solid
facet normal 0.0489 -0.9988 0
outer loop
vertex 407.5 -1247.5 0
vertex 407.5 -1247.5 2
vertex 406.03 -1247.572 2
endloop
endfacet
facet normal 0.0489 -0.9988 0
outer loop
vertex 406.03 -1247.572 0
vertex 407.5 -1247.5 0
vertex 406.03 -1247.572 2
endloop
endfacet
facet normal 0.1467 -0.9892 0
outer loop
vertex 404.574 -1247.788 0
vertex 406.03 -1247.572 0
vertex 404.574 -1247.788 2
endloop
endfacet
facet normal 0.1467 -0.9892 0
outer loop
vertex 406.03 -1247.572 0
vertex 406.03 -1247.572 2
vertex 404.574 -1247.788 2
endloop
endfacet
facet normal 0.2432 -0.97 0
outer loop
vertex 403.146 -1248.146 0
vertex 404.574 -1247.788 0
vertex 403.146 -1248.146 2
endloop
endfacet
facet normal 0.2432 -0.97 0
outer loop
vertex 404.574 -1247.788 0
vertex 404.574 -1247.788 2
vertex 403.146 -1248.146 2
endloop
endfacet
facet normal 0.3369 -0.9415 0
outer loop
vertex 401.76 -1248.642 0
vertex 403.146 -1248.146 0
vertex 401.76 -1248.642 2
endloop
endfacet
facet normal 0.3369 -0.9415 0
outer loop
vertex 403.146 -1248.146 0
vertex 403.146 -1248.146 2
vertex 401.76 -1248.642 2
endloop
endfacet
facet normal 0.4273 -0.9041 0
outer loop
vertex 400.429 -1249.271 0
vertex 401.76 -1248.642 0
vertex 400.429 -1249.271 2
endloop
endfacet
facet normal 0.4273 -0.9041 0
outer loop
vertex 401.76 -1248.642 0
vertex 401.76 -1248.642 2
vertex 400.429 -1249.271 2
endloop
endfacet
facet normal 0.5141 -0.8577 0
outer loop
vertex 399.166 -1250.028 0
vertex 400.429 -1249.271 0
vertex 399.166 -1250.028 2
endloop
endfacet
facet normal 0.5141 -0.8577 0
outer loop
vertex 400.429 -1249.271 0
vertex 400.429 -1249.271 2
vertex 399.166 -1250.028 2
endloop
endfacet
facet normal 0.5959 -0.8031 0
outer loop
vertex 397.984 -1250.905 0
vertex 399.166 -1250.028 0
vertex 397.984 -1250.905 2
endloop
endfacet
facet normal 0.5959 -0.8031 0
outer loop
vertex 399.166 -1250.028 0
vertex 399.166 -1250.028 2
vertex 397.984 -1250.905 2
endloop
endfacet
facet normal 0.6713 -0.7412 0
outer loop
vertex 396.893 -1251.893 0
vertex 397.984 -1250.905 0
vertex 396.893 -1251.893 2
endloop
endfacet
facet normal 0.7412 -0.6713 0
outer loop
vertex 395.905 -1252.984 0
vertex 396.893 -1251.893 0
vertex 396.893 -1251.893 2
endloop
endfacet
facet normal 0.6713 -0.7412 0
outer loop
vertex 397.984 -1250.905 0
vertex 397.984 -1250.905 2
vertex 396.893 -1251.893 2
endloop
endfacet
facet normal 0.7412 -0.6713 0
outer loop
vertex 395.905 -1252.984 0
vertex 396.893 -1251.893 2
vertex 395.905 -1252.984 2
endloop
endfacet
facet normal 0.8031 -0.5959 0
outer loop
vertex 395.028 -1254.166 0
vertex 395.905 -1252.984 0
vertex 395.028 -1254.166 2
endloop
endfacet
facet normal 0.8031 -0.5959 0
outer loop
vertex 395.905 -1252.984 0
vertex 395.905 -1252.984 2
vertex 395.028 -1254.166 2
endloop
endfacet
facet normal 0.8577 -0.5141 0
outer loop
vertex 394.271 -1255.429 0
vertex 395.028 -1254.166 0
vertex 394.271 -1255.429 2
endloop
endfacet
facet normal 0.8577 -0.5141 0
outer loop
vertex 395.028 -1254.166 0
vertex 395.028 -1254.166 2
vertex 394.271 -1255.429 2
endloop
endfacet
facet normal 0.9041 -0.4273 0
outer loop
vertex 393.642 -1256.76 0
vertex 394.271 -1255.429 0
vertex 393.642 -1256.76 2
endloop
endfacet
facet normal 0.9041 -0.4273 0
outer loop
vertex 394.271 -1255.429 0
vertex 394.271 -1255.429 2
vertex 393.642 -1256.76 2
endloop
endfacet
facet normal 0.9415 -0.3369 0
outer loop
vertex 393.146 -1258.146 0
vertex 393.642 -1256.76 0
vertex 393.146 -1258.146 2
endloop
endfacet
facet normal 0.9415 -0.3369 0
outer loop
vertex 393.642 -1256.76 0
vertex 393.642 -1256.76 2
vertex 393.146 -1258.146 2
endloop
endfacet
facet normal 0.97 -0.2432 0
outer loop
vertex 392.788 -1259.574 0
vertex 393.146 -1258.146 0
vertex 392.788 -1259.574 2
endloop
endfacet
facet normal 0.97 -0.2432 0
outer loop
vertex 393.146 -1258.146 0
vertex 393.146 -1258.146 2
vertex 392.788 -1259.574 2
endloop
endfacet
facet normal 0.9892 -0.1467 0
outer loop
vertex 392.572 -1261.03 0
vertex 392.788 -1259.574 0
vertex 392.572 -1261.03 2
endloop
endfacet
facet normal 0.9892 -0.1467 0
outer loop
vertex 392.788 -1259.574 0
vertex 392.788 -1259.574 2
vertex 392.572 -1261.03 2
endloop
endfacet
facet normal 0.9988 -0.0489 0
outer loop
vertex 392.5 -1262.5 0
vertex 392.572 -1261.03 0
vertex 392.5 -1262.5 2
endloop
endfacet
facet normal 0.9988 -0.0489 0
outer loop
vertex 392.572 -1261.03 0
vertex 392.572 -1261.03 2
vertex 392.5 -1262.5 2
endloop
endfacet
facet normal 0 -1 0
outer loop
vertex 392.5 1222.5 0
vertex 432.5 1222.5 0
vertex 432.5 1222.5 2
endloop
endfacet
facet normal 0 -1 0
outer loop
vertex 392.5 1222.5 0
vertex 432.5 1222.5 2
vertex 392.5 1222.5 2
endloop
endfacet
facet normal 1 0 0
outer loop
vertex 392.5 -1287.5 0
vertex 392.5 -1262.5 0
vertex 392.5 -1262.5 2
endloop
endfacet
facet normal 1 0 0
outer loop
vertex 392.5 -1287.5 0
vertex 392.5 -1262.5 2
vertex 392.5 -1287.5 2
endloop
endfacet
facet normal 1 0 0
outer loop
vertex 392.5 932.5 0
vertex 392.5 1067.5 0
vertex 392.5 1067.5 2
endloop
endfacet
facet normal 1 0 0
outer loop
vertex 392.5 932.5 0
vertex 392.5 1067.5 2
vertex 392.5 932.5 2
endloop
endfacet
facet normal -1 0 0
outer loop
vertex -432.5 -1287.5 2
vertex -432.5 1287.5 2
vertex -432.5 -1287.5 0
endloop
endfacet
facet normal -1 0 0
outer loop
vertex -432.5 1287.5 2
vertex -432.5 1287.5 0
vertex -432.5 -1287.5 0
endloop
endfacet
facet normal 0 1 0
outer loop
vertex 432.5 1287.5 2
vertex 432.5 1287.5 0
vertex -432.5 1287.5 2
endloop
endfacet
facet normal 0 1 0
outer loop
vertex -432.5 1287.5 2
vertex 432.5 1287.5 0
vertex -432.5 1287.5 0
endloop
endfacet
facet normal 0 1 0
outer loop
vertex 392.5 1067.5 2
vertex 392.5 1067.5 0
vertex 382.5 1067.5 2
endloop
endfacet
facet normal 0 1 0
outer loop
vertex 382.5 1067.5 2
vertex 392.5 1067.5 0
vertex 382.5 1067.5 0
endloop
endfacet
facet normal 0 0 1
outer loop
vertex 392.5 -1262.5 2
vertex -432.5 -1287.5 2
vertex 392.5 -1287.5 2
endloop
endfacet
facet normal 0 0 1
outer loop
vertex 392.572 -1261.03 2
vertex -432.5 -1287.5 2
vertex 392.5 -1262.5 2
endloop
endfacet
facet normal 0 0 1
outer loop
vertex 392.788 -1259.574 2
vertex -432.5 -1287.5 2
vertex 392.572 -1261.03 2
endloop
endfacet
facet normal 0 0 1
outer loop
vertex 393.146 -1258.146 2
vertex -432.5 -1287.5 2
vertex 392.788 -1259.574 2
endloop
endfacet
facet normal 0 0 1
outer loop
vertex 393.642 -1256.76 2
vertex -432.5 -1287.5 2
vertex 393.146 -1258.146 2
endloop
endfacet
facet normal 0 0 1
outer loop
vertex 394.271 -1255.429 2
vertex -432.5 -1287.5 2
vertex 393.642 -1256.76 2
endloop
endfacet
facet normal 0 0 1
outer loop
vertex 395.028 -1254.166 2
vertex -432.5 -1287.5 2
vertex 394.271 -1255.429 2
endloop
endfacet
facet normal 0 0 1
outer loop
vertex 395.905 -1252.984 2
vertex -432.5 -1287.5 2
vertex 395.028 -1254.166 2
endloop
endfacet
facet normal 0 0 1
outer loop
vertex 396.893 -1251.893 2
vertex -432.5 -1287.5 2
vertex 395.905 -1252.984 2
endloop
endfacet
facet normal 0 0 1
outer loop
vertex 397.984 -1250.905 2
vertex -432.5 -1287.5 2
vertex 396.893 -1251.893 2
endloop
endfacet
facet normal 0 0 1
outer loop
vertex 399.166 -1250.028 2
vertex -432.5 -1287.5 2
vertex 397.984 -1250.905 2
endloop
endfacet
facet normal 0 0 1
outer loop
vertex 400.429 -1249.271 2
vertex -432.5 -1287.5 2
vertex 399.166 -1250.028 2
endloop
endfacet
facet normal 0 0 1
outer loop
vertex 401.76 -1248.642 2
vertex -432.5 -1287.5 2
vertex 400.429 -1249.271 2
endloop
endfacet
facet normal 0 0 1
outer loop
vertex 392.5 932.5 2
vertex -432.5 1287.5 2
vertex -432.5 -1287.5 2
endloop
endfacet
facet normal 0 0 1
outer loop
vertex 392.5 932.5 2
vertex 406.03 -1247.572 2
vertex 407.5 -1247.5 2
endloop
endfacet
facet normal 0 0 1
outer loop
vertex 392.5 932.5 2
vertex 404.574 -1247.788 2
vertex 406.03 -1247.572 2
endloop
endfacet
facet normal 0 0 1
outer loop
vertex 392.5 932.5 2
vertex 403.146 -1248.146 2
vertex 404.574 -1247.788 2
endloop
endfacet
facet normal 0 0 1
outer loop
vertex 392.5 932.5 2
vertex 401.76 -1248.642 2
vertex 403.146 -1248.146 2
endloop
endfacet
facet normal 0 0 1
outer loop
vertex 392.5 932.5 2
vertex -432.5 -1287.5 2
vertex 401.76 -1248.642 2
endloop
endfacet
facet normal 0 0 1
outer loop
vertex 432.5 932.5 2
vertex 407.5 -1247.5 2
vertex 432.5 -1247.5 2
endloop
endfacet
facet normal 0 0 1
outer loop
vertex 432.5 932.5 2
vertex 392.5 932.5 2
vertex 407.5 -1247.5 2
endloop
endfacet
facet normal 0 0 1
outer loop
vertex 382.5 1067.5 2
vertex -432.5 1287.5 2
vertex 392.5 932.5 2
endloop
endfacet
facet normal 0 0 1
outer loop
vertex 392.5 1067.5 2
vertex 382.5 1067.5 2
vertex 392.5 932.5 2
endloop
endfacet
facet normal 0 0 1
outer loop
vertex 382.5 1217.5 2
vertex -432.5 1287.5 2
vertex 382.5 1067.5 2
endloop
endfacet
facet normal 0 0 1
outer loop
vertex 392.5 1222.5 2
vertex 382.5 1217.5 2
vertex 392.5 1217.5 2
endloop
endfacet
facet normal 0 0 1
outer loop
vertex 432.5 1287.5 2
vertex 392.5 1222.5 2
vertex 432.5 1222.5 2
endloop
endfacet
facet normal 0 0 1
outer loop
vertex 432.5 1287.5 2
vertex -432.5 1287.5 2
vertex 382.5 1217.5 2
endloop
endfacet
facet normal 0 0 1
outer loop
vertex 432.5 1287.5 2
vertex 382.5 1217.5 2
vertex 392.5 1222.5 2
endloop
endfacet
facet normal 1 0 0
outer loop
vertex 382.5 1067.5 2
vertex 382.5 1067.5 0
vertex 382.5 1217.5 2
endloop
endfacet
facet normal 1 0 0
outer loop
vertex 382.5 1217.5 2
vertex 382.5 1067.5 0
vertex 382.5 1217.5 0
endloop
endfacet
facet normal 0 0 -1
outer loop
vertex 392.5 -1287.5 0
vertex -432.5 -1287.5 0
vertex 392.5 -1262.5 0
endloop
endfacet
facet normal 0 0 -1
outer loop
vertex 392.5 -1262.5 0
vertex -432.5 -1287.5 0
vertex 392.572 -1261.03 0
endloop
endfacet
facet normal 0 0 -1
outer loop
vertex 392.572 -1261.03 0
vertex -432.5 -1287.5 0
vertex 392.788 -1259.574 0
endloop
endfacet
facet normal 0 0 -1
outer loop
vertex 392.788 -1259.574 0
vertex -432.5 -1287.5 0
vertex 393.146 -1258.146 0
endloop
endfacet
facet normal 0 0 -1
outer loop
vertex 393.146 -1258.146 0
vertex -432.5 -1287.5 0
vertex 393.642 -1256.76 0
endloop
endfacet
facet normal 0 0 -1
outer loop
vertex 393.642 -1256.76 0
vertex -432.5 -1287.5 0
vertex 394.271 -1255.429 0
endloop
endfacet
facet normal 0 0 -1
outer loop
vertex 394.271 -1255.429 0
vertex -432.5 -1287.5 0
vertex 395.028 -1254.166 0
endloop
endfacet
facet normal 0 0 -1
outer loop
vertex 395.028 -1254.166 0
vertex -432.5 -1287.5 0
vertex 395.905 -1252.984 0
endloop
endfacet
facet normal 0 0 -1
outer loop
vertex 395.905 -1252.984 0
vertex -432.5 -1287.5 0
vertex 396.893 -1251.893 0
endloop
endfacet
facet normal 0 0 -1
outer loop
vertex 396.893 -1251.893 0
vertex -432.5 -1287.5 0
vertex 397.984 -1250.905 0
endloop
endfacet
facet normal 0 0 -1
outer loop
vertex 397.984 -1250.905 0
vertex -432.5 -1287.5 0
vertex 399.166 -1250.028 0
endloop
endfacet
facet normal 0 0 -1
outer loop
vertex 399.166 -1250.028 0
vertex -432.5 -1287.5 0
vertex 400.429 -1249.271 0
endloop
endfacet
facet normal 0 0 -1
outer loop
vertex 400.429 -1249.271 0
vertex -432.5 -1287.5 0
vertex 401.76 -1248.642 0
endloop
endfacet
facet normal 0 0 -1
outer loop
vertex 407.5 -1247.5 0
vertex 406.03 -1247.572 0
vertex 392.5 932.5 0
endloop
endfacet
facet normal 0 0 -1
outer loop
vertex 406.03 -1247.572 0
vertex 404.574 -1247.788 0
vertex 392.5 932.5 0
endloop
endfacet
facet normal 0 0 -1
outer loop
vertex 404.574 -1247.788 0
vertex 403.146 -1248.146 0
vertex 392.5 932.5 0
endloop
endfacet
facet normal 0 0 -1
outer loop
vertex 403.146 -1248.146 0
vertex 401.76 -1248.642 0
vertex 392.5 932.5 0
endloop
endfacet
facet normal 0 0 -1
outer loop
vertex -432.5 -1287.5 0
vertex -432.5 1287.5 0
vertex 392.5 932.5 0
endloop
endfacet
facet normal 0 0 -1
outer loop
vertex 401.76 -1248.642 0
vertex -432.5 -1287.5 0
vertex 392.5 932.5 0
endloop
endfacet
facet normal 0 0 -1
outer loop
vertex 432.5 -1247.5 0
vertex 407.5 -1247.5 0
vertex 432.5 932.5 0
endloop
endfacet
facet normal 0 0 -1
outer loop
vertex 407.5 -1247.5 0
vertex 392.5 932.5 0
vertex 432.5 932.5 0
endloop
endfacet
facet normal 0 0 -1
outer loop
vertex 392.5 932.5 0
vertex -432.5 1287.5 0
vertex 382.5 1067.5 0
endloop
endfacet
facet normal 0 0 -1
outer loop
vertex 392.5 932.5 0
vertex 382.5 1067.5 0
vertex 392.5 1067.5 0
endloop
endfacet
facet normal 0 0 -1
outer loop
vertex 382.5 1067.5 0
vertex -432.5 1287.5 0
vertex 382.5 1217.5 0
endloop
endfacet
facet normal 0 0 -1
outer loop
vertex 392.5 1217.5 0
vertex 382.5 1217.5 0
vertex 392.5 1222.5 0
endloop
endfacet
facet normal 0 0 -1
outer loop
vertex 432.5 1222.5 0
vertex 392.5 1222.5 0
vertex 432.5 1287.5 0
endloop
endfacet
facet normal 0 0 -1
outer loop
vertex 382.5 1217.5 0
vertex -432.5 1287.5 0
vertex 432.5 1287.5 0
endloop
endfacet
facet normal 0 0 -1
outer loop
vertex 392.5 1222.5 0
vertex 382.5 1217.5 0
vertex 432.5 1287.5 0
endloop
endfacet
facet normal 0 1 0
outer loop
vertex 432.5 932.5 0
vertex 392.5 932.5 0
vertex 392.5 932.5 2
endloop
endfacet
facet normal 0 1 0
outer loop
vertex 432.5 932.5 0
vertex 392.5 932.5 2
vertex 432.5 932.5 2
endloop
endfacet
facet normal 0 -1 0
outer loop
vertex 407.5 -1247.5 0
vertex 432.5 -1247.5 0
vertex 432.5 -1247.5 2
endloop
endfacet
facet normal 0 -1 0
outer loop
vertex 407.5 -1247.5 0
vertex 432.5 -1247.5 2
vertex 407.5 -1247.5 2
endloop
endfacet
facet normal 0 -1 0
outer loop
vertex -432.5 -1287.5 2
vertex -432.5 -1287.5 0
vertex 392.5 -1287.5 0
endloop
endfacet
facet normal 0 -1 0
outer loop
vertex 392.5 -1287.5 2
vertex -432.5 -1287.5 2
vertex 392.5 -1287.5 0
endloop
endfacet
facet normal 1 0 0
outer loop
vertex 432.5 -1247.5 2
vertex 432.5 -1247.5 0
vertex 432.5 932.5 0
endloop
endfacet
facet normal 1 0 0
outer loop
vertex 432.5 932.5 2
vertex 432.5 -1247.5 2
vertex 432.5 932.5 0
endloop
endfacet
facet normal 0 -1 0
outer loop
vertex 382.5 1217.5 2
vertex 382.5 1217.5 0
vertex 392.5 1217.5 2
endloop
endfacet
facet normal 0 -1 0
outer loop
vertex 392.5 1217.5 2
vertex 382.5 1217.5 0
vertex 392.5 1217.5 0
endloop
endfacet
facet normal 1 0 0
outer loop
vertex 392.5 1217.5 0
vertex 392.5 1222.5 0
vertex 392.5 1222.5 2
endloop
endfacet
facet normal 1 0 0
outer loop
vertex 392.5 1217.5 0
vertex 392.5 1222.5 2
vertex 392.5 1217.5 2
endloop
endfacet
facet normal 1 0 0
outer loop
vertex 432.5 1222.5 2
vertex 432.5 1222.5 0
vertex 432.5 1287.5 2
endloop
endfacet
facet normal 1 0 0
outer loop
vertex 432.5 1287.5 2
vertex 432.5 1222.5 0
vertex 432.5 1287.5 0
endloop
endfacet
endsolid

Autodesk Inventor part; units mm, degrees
ref_plane "YZ Plane" through (0, 0, 0) normal (1, 0, 0) x (0, 1, 0)
ref_plane "XZ Plane" through (0, 0, 0) normal (0, 1, 0) x (-1, 0, 0)
ref_plane "XY Plane" through (0, 0, 0) normal (0, 0, 1) x (1, 0, 0)
sketch "Sketch1" plane through (0, 0, 0) normal (0, 0, 1) x (1, 0, 0)
  line L0 (-432.5, -1287.5) -> (432.5, -1287.5)
  line L1 (432.5, -1287.5) -> (432.5, 1287.5)
  line L2 (432.5, 1287.5) -> (-432.5, 1287.5)
  line L3 (-432.5, 1287.5) -> (-432.5, -1287.5)
  line L4 (-432.5, -1287.5) -> (432.5, 1287.5) construction
  line L5 (432.5, -1287.5) -> (-432.5, 1287.5) construction
  line L6 (432.5, -1247.5) -> (392.5, -1247.5)
  line L7 (392.5, -1247.5) -> (392.5, -1287.5)
  line L8 (432.5, 1222.5) -> (392.5, 1222.5)
  line L9 (392.5, 1222.5) -> (392.5, 932.5)
  line L10 (392.5, 932.5) -> (432.5, 932.5)
  line L11 (432.5, 932.5) -> (432.5, 1222.5)
  line L12 (392.5, 1067.5) -> (382.5, 1067.5)
  line L13 (382.5, 1067.5) -> (382.5, 1217.5)
  line L14 (382.5, 1217.5) -> (392.5, 1217.5)
  point P0 (0, 0)
  point P1 (432.5, 932.5)
  dimension "d154" = 865
  dimension "d155" = 2575
  dimension "d157" = 40
  dimension "d159" = 290
  dimension "d161" = 40
  dimension "d162" = 2220
  dimension "d163" = 10
  dimension "d164" = 150
  dimension "d165" = 5
extrude "Plate5" add sketch "Sketch1" along normal blind 2 contours L3 L2 L1 L8 L9 L14 L13 L12 L10 L6 L7 L0
fillet "Corner Round1" radius 15 1 edges at (392.5, -1247.5, 1)
properties part number "PNS-0115 floor sheet 5" material "Stainless Steel"
